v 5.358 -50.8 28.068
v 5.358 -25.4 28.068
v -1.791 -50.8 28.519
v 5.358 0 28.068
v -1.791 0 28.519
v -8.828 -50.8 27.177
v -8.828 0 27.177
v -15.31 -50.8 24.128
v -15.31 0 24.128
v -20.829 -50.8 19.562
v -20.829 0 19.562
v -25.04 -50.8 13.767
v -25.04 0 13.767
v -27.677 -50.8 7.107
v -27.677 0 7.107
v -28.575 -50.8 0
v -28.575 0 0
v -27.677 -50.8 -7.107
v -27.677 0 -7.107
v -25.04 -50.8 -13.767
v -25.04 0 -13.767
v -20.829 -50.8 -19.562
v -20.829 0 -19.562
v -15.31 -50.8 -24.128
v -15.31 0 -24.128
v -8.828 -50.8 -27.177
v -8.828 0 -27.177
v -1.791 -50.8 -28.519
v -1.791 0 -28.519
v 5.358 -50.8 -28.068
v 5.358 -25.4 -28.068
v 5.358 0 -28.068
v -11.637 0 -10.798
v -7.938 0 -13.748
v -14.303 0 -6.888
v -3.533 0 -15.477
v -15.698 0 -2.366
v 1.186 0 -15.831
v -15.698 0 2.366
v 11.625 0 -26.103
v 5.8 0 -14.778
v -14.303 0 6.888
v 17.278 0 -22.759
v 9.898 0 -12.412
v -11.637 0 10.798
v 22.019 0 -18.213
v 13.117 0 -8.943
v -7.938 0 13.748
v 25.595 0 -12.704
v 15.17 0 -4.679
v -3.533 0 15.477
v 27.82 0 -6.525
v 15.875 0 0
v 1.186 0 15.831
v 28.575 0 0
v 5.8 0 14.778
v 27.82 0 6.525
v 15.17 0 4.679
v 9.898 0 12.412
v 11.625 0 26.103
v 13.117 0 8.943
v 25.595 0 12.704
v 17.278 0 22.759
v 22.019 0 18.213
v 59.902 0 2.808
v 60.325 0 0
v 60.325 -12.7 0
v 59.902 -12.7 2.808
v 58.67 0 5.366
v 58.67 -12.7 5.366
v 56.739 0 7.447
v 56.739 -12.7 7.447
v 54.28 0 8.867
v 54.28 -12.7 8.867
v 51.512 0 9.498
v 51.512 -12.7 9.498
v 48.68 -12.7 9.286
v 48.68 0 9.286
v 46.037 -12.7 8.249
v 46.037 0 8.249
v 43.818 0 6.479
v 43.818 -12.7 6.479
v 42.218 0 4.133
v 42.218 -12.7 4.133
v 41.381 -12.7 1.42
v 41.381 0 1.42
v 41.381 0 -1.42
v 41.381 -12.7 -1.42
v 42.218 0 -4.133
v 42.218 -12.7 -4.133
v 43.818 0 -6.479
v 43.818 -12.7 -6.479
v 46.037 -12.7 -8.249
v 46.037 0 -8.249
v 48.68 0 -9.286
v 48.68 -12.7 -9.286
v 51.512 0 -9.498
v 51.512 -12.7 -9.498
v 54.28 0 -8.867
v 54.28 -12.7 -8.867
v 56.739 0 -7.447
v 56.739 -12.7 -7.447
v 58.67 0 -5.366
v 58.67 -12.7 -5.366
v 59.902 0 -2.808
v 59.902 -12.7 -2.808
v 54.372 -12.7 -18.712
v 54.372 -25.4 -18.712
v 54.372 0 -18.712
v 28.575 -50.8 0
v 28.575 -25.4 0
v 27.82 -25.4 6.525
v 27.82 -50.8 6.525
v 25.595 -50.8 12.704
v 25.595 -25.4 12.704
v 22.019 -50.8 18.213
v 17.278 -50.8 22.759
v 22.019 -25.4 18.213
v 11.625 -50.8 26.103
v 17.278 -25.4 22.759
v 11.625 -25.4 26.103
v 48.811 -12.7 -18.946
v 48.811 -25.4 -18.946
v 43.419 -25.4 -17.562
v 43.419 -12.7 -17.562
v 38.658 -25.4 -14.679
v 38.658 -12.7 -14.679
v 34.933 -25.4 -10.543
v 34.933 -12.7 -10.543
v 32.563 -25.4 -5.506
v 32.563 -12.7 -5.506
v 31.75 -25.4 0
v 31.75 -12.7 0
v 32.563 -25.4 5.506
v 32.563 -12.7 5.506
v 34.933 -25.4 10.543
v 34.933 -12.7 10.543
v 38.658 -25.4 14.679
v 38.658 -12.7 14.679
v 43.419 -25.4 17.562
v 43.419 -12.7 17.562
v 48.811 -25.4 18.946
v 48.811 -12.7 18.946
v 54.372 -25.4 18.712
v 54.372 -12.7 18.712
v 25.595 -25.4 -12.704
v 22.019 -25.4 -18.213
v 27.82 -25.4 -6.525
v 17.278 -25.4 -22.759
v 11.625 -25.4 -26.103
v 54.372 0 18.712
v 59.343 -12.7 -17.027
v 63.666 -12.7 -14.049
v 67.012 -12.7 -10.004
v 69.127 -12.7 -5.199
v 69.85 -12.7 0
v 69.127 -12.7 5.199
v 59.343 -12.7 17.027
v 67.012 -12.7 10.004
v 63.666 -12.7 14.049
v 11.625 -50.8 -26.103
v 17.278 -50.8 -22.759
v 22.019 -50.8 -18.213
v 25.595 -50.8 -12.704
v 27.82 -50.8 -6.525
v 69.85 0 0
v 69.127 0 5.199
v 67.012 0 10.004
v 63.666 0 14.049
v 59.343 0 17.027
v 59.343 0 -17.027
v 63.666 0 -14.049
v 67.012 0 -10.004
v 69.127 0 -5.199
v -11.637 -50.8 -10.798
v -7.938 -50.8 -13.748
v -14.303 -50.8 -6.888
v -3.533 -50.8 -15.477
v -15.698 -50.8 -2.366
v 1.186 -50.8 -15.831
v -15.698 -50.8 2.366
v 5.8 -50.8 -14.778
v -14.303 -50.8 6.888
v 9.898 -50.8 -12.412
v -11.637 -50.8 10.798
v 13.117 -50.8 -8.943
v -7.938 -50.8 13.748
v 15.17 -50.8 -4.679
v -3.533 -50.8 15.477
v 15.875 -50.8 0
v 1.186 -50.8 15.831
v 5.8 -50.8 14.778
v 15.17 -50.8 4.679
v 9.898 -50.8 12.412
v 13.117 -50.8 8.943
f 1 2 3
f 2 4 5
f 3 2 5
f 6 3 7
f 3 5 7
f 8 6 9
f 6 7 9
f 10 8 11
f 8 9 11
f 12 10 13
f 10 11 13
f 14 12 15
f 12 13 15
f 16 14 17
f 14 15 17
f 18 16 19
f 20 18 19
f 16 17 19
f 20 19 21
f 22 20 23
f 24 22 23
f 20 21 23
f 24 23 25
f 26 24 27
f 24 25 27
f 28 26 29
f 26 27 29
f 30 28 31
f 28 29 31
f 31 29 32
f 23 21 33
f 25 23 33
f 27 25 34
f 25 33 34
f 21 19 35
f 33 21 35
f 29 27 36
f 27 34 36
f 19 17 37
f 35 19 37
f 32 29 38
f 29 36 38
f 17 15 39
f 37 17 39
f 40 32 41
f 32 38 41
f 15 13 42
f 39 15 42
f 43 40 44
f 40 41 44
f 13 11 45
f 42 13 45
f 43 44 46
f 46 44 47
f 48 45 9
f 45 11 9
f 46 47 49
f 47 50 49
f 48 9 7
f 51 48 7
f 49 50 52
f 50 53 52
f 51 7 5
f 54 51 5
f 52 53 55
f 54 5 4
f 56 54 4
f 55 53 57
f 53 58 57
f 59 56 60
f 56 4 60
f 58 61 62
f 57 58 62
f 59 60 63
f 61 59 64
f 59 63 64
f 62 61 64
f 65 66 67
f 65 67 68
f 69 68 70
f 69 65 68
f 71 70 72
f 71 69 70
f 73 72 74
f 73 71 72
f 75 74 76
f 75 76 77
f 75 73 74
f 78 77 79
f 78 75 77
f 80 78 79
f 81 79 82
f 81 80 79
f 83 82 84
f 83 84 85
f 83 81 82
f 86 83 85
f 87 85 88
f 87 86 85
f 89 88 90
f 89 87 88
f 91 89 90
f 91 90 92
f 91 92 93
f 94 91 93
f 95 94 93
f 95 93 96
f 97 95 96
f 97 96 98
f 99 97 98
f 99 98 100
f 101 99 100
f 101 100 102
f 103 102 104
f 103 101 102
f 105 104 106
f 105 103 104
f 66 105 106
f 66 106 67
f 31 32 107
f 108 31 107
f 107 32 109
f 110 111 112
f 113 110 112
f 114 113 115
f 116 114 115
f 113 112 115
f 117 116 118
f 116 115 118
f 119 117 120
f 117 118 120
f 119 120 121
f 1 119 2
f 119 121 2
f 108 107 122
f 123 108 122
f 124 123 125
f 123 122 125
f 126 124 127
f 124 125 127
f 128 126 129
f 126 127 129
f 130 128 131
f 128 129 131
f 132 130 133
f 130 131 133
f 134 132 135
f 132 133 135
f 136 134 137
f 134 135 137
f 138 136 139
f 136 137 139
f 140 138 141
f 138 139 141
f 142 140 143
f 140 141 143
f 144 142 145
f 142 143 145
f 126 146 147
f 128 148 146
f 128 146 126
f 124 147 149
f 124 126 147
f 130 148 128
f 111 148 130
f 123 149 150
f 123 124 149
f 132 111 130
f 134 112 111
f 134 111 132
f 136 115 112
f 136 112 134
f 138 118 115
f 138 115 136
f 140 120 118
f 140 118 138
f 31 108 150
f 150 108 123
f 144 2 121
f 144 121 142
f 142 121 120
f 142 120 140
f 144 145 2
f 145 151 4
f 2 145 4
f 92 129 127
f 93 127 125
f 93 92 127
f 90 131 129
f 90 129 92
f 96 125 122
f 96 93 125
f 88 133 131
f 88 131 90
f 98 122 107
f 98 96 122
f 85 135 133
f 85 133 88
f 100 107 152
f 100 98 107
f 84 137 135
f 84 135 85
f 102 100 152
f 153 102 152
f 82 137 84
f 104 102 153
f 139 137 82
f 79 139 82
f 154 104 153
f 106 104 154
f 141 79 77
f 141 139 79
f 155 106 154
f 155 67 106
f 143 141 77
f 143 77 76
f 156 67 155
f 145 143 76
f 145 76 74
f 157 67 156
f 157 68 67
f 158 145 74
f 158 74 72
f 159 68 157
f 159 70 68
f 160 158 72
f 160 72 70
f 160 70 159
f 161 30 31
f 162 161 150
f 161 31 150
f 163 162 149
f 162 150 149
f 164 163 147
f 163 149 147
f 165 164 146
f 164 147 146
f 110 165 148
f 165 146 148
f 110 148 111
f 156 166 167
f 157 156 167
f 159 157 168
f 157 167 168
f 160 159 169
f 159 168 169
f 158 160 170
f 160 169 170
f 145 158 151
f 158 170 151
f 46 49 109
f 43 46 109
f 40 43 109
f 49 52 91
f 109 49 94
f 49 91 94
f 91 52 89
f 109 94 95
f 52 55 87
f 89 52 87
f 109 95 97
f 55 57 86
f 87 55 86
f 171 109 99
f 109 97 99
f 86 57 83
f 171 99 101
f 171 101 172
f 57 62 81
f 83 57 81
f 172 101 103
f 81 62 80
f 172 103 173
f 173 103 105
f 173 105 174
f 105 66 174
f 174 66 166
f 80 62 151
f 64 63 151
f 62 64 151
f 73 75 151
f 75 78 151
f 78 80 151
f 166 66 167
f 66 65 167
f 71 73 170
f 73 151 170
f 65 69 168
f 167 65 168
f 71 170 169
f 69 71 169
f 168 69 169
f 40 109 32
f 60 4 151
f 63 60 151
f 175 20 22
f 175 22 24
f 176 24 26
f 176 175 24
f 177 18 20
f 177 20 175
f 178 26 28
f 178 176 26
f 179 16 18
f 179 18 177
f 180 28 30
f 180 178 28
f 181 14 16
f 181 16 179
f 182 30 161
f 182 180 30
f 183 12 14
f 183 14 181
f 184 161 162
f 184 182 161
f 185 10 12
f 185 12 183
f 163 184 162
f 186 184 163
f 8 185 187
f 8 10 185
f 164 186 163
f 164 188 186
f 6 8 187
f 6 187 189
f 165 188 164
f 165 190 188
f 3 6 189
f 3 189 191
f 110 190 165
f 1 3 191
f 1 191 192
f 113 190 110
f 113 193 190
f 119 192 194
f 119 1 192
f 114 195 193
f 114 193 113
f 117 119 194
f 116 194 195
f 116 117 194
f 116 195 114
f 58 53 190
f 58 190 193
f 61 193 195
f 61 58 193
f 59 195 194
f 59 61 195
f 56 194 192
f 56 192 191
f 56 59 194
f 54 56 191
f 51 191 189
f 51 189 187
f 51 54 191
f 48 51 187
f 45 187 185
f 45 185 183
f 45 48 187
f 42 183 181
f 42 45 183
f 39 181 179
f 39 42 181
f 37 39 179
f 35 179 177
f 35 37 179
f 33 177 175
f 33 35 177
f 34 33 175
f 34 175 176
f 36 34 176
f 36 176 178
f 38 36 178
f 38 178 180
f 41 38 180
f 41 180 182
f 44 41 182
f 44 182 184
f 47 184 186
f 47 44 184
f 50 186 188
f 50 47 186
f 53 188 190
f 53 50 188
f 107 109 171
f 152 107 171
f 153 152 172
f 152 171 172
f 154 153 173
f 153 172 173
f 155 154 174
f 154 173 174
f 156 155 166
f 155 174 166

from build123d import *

# Parameters (mm, degrees)
F1_DEPTH = 25.4
F0_R     = 15.875
F2_DEPTH = 50.8
F0_R_2   = 9.525
F3_DEPTH = 12.7


with BuildPart() as f1:
    # F0 (on Front) → F1 (new body)
    with BuildSketch(Plane.XZ):
        with BuildLine():
            ThreePointArc((5.357812, 28.068211), (22.018516, 18.21306), (28.575, 0))
            ThreePointArc((28.575, 0), (22.018516, -18.21306), (5.357812, -28.068211))
            Line((5.357813, -28.068211), (54.371875, -18.712141))
            ThreePointArc((54.371875, -18.712141), (31.75, 0), (54.371875, 18.712141))
            Line((54.371875, 18.712141), (5.357812, 28.068211))
        make_face()
    extrude(amount=F1_DEPTH)

    # F0 (on Front) → F2 (join)
    with BuildSketch(Plane.XZ):
        with BuildLine():
            ThreePointArc((5.357812, -28.068211), (22.018516, -18.21306), (28.575, 0))
            ThreePointArc((28.575, 0), (22.018516, 18.21306), (5.357812, 28.068211))
            ThreePointArc((5.357812, 28.068211), (-28.575, 0), (5.357812, -28.068211))
        make_face()
        Circle(F0_R, mode=Mode.SUBTRACT)
    extrude(amount=F2_DEPTH)

    # F0 (on Front) → F3 (join)
    with BuildSketch(Plane.XZ):
        with BuildLine():
            ThreePointArc((69.85, 0), (65.479011, 12.14204), (54.371875, 18.712141))
            ThreePointArc((54.371875, 18.712141), (31.75, 0), (54.371875, -18.712141))
            ThreePointArc((54.371875, -18.712141), (65.479011, -12.14204), (69.85, 0))
        make_face()
        with Locations((50.8, 0)):
            Circle(F0_R_2, mode=Mode.SUBTRACT)
    extrude(amount=F3_DEPTH)


solid = f1.part
